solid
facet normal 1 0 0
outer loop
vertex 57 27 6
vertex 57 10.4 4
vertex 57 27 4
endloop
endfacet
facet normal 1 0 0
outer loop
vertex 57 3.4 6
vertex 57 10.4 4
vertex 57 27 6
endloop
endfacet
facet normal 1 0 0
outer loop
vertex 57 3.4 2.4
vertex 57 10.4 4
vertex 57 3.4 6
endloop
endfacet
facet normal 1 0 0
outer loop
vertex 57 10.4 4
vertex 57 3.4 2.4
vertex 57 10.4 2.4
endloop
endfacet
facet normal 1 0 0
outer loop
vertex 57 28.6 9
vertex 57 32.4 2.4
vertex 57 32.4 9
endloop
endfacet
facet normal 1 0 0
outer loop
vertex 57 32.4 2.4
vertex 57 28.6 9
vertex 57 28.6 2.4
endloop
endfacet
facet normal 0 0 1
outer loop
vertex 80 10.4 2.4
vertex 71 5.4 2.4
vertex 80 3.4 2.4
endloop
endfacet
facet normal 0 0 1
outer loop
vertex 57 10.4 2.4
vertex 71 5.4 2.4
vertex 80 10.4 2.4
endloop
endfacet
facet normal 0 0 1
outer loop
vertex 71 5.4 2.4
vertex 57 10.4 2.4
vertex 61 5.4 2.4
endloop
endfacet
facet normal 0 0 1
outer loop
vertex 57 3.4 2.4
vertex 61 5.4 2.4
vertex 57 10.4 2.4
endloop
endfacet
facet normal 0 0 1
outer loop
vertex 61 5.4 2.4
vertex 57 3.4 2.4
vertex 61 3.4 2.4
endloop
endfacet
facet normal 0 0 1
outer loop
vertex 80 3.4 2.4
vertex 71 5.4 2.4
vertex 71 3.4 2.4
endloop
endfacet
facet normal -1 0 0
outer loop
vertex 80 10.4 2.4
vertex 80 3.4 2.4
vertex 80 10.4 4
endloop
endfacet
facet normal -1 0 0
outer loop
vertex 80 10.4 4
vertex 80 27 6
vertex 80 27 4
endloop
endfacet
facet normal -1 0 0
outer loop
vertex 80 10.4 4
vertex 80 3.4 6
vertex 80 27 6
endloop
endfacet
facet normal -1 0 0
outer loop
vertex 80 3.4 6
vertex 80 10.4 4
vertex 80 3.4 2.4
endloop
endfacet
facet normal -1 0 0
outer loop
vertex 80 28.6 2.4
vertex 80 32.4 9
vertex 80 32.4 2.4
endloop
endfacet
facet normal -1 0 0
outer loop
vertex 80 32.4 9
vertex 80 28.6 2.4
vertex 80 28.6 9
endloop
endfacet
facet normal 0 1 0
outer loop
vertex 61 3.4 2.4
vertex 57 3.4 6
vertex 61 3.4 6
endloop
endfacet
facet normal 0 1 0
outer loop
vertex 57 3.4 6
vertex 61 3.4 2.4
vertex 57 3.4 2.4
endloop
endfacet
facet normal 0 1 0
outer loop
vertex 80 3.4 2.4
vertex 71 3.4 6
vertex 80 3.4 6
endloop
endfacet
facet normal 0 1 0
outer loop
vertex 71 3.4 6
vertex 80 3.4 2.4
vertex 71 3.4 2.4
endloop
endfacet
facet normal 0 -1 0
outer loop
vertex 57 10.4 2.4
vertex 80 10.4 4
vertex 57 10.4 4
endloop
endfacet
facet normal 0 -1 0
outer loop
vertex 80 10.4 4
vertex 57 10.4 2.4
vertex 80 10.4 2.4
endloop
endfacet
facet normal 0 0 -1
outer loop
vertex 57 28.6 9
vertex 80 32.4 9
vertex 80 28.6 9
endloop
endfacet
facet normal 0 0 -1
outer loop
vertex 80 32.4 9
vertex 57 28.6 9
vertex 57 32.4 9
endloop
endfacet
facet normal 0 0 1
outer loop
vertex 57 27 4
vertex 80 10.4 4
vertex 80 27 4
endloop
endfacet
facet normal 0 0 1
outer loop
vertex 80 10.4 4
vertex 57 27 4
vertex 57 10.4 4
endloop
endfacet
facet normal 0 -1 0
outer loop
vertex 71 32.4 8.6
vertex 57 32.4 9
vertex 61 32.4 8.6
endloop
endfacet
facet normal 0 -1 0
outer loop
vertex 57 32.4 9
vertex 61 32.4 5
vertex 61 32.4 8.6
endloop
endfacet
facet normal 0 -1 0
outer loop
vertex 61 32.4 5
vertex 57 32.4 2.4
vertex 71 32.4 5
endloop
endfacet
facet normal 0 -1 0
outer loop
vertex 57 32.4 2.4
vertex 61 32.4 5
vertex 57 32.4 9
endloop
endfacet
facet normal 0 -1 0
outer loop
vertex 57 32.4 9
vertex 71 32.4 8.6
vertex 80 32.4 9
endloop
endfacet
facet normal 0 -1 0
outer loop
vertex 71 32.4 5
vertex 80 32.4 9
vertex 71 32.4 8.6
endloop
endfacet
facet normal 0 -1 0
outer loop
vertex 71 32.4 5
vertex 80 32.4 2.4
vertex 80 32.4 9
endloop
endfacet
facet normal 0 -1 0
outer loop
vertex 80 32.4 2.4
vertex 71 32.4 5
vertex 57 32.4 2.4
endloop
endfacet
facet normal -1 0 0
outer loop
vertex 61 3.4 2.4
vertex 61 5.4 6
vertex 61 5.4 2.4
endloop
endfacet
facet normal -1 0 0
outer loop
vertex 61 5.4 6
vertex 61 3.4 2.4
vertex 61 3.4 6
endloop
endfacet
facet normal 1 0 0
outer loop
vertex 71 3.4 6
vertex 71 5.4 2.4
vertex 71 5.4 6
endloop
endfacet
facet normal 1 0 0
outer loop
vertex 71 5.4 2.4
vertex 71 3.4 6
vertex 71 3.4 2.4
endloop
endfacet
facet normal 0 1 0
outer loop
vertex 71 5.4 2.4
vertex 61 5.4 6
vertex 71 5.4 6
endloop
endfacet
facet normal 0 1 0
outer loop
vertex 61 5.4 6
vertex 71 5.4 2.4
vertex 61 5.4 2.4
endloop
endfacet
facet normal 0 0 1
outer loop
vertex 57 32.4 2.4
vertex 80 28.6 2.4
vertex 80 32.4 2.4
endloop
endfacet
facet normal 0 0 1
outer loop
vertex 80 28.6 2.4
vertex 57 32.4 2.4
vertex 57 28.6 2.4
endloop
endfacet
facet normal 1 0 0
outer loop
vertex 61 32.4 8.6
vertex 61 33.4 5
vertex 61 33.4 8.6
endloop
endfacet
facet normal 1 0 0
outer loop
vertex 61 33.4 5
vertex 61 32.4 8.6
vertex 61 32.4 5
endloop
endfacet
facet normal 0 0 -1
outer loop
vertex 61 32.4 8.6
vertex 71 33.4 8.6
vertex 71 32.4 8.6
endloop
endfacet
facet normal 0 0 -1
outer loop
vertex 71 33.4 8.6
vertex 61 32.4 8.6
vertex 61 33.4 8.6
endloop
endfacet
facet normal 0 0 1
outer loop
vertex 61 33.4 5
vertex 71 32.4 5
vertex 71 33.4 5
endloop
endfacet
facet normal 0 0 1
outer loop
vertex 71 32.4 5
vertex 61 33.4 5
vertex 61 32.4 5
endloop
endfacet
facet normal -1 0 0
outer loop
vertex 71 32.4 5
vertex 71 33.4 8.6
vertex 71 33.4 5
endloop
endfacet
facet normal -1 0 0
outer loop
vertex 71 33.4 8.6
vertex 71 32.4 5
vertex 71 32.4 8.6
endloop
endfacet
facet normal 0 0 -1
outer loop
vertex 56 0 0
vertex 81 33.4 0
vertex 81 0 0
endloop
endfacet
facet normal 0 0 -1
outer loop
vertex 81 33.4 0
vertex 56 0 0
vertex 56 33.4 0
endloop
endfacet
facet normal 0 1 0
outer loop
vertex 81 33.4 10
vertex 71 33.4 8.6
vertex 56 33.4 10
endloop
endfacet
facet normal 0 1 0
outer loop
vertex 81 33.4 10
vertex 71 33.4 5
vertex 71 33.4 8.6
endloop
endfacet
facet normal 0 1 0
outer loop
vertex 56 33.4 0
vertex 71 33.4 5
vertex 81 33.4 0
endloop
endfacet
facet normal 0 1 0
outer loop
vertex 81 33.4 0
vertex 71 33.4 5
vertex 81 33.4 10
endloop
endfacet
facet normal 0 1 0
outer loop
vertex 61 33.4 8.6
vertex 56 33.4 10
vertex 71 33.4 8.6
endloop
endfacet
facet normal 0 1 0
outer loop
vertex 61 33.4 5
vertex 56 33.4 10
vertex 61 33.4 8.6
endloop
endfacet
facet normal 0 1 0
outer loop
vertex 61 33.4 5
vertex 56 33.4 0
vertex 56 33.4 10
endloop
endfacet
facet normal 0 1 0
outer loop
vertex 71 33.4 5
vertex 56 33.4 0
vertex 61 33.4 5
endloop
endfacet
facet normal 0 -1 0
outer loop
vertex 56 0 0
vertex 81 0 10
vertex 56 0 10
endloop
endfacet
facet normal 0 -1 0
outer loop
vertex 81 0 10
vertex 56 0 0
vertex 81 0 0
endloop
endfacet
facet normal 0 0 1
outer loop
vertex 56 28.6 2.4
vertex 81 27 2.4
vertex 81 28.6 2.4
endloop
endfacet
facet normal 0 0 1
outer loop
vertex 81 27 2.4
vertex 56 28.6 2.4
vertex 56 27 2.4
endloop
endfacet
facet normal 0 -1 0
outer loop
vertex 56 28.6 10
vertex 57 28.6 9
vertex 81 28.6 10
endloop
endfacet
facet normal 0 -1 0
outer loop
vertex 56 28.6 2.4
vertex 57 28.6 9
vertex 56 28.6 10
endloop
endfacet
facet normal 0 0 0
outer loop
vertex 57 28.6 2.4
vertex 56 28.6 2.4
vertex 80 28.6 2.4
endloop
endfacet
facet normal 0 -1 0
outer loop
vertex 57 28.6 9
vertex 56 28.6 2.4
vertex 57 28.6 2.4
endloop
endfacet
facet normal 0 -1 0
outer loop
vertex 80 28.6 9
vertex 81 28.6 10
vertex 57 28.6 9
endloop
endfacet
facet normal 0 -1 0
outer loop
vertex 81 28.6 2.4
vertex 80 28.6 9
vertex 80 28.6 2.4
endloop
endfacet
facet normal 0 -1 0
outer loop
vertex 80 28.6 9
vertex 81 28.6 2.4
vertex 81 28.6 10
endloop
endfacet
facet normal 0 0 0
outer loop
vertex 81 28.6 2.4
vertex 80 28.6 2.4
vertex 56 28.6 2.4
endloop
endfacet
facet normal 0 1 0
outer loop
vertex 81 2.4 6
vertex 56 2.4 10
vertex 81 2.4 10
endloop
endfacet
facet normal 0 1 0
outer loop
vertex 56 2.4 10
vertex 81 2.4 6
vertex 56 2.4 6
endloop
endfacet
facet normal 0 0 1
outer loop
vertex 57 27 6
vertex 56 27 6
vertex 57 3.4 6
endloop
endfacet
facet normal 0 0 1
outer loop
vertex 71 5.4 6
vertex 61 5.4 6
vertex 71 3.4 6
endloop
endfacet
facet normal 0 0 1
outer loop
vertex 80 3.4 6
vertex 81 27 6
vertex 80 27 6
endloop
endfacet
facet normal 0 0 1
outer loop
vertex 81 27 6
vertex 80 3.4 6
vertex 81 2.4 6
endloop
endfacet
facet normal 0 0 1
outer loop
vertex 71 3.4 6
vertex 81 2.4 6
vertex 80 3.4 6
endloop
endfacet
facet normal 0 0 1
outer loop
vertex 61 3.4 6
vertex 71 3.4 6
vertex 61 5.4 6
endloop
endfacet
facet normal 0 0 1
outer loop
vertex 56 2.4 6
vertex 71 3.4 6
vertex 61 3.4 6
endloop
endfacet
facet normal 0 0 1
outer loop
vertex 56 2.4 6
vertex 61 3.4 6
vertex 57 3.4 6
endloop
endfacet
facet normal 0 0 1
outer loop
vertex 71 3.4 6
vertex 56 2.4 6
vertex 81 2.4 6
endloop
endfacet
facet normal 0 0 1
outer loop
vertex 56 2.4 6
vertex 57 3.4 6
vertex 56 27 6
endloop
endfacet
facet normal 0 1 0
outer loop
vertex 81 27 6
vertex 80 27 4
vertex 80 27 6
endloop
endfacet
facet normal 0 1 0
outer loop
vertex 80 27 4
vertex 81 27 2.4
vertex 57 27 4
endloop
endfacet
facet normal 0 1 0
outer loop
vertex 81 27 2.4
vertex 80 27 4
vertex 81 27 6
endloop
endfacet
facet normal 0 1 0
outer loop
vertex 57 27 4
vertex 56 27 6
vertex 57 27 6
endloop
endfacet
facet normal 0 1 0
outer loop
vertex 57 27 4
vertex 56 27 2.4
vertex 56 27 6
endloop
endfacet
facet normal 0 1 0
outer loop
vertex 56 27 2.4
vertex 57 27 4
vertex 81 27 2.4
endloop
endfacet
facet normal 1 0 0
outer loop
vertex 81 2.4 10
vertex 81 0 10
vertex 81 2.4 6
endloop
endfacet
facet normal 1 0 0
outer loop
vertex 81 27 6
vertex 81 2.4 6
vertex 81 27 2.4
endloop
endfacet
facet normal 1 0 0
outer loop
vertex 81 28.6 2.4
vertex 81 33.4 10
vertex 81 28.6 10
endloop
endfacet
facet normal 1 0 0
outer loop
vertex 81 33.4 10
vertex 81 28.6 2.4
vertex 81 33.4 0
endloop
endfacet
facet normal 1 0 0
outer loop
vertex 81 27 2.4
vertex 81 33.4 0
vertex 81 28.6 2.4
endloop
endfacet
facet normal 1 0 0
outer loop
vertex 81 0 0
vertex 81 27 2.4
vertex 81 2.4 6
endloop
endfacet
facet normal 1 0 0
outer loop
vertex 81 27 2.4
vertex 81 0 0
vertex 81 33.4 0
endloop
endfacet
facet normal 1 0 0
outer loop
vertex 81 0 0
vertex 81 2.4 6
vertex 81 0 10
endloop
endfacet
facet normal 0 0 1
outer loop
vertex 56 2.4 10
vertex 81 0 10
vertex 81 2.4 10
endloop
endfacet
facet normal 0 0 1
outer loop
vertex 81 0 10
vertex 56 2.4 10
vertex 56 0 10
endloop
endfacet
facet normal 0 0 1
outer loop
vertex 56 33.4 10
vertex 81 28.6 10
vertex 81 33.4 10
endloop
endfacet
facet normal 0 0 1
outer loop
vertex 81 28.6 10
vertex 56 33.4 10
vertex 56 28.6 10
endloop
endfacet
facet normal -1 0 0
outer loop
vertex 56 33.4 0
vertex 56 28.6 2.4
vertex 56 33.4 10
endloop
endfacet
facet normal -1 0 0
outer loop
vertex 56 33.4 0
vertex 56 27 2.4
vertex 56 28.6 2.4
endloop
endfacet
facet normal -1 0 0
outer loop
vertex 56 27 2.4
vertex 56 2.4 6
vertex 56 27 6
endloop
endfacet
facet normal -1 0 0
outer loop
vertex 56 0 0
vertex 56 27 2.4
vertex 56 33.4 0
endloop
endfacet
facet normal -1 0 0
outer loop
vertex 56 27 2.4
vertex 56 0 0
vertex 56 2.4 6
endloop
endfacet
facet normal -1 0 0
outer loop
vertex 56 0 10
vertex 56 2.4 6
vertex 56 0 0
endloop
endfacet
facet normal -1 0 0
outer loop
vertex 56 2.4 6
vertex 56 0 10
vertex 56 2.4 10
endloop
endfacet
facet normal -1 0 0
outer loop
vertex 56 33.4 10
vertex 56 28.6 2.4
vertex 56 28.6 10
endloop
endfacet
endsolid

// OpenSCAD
$fn = 64;

thickness = 2.4;

width = 120;
depth = 31;
height = 30;

triangle = 24;
triangle_1 = 5;

hole_r = 10;

module trianglethingi() {
  hull() {
    translate([triangle, depth, 0]) {
      cube([triangle_1, thickness, height]);
    }
    translate([0, depth, 0]) {
      cube([triangle_1, thickness, height + triangle]);
    }
  }
}

module box() {
  difference() {
    cube([width, depth + thickness, height]);
    translate([thickness, thickness, thickness]) {
      cube([width - (thickness * 2), depth - (thickness * 2), height]);
    }
    translate([hole_r + 25, 2, height - hole_r]) {
      translate([-hole_r + 3.5, -3, 0]) {
        cube([13, 5, hole_r + 1]);
      }

      rotate(90, [1, 0, 0]) {
        translate([0, 0, -thickness]) {
          cylinder(h = thickness * 3, r = hole_r);
        }
      }
    }
    translate([80, 34.4, -5]) {
      rotate(180, [0, 0, 1]) {
        usbc();
      }
    }
  }
  difference() {
    translate([55, 0, 0]) {
      cube([27, depth - 4, 6]);
    }
    translate([80, 34.4, -5]) {
      rotate(180, [0, 0, 1]) {
        usbc();
      }
    }
  }

  trianglethingi();
  translate([width, 0, 0]) {
    mirror([1, 0, 0]) {
      trianglethingi();
    }
  }
}
// usb-C

module usbc(head = true) {
  translate([10, 1, 10]) {
    if (head) {
      translate([-1, 0, 0]) {
        cube([10, 5, 3.6]);
      }
    }
    translate([-10, 1, -1]) {
      translate([0, 0, -1.6]) {
        cube([23, 5, 5]);
      }
      difference() {
        union() {
          translate([0, 22, -1.6]) {
            cube([23, 7, 5]);
          }
          cube([23, 29, 5]);
        }
        translate([9, 27, -10]) {
          cube([10, 5, 20]);
        }
      }
    }
  }
}

// box();
intersection() {
  box();
  translate([56, 0, 0]) {
    cube([25, 35, 10]);
  }
}
// !usbc();
